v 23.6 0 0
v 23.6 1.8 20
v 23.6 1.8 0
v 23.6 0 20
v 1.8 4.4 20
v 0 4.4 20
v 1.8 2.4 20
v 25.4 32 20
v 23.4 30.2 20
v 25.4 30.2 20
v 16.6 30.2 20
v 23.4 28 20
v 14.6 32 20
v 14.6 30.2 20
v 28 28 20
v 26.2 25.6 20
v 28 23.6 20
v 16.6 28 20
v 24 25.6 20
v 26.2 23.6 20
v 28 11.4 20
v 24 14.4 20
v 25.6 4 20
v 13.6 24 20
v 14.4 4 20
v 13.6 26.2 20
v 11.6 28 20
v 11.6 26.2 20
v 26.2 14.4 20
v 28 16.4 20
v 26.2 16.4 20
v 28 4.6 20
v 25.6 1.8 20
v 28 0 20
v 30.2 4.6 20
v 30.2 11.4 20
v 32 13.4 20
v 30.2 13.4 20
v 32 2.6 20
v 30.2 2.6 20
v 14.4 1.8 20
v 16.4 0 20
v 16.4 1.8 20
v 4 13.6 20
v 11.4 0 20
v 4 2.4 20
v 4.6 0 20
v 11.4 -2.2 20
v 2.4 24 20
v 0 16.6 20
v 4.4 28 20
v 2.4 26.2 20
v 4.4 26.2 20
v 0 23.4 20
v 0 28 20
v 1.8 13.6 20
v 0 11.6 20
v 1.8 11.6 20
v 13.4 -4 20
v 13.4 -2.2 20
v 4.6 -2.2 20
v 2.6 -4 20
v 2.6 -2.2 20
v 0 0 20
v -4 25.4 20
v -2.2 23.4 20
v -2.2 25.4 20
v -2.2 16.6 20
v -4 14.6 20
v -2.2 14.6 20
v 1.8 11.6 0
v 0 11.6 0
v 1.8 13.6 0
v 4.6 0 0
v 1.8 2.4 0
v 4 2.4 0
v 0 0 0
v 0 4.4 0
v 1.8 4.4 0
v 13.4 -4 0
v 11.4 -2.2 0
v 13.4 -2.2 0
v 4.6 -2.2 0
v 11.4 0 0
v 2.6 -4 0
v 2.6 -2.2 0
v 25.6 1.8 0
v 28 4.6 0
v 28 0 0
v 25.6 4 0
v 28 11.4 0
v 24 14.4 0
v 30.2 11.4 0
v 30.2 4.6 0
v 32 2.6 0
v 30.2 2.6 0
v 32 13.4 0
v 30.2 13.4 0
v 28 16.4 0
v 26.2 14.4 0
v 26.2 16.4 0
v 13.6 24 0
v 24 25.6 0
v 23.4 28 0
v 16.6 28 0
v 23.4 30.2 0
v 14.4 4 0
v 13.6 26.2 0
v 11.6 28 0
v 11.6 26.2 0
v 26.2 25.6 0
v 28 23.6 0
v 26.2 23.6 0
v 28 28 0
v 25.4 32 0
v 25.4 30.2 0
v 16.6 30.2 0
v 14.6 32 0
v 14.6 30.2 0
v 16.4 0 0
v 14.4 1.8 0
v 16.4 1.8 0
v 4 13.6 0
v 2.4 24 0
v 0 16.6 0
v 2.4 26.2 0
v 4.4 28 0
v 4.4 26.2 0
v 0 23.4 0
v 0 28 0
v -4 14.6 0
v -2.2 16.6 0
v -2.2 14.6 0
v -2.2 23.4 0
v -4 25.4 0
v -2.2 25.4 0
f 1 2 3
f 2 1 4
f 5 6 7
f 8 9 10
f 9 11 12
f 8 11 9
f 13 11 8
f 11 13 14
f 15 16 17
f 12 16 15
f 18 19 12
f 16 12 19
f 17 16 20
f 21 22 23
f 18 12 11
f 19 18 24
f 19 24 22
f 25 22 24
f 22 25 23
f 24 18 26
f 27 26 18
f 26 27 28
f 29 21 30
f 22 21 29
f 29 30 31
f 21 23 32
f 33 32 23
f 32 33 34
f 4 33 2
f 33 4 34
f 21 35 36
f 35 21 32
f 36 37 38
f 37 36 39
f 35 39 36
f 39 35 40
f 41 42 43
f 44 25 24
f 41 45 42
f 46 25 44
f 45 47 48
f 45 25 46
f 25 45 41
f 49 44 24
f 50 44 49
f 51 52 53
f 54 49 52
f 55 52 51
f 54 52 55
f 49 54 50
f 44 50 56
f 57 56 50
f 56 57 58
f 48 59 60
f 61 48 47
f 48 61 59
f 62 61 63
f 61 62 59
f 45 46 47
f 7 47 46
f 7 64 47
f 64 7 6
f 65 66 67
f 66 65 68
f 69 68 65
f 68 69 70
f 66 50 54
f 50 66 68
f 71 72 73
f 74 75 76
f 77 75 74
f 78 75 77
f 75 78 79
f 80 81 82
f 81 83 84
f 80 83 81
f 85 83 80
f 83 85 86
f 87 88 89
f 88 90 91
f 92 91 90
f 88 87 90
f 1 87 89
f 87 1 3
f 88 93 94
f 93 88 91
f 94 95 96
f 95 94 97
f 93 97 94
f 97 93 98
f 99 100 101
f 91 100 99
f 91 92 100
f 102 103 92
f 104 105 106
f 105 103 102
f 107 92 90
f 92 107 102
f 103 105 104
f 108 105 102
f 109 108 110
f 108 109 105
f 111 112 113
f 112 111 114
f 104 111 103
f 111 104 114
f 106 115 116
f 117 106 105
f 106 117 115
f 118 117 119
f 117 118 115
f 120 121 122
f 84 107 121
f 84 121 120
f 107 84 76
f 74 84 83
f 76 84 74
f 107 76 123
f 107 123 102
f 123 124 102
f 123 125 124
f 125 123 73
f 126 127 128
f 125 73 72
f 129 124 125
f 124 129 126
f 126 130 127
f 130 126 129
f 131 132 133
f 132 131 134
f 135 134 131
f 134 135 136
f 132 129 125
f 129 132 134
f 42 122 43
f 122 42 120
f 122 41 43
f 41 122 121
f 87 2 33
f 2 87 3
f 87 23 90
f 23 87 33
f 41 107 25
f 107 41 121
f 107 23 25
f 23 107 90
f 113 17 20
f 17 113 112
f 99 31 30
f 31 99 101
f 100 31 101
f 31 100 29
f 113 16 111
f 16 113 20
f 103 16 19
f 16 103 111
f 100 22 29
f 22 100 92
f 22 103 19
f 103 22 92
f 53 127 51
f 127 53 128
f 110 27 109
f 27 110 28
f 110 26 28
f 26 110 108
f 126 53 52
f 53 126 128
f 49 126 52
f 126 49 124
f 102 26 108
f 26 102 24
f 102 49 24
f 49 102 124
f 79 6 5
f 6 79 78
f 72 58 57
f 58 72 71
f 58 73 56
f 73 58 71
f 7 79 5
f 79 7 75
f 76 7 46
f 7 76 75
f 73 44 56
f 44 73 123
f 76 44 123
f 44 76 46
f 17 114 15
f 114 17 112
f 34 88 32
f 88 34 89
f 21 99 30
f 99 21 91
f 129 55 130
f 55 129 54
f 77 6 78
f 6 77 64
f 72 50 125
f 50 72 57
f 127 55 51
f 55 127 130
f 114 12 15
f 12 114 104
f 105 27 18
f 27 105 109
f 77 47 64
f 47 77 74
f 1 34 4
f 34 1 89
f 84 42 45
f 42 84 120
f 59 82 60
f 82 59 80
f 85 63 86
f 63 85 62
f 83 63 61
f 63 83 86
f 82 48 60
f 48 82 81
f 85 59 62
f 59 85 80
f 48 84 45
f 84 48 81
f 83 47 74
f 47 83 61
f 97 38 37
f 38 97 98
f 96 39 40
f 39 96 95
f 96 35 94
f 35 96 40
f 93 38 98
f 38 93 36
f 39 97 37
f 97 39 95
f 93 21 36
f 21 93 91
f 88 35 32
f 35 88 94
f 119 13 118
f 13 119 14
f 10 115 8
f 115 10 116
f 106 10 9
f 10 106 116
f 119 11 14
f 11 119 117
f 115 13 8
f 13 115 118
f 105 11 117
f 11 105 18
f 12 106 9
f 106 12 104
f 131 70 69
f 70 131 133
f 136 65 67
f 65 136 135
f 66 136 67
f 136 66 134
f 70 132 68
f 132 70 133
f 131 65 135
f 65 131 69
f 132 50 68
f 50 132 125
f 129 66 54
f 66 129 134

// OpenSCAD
/* [Settings] */

clearence = 0.2;

corner = false;
wall = false;

length = 1;
width = 1;
height = 20;

/* [Hidden] */

c = clearence;
size = [length, width, height]; //size

left_disabled = corner || wall;
right_disabled = corner;

module connector (h) {
    translate([2.5+c/2, 0, 0]) {
        cube([11-c, 2-c, h]);
        translate([2, 2-c, 0]) {
            cube([7-c, 2+c, h]);
        }
    }
}

module connectors (h, count) {
    for (i = [0:28:(count-1)*28]) {
        translate([i, -3.99999, 0]) {
            connector(h);
        }
    }
}

module insert (h) {
    translate([16.5-c/2, 0, 0]) {
        cube([7+c, 2-c, h]);
        translate([-2, 2-c, 0]) {
            cube([11+c, 2+c, h]);
        }
    }
}

module inserts (h, count) {
    for (i = [0:28:(count-1)*28]) {
        translate([i, -0.00001, 0]) {
            insert(h);
        }
    }
}
union () {
    difference () {
        cube([size[0]*28, size[1]*28, size[2]]);
        for (i = [0:3]) {
            if (i==0 && !left_disabled) {
                inserts(size[2], size[0]);
            } else if (i==1) {
                rotate([0, 0, 90]) {
                    translate([0, -size[0]*28, 0]) {
                        inserts(size[2], size[1]);
                    }
                }
            } else if (i==2) {
               rotate([0, 0, 180]) {
                   translate([-size[0]*28, -size[1]*28, 0]) {
                       inserts(size[2], size[0]);
                   }
               }
            } else if (i==3 && !right_disabled) {
                rotate([0, 0, 270]) {
                    translate([-size[1]*28, 0, 0]) {
                        inserts(size[2], size[1]);
                    }
                }
            }
        }
    }
    for (i = [0:3]) {
        if (i==0 && !left_disabled) {
            connectors(size[2], size[0]);
        } else if (i==1) {
            rotate([0, 0, 90]) {
                translate([0, -size[0]*28, 0]) {
                    connectors(size[2], size[1]);
                }
            }
        } else if (i==2) {
           rotate([0, 0, 180]) {
               translate([-size[0]*28, -size[1]*28, 0]) {
                   connectors(size[2], size[0]);
               }
           }
        } else if (i==3 && !right_disabled) {
            rotate([0, 0, 270]) {
                translate([-size[1]*28, 0, 0]) {
                    connectors(size[2], size[1]);
                }
            }
        }
    }
}
